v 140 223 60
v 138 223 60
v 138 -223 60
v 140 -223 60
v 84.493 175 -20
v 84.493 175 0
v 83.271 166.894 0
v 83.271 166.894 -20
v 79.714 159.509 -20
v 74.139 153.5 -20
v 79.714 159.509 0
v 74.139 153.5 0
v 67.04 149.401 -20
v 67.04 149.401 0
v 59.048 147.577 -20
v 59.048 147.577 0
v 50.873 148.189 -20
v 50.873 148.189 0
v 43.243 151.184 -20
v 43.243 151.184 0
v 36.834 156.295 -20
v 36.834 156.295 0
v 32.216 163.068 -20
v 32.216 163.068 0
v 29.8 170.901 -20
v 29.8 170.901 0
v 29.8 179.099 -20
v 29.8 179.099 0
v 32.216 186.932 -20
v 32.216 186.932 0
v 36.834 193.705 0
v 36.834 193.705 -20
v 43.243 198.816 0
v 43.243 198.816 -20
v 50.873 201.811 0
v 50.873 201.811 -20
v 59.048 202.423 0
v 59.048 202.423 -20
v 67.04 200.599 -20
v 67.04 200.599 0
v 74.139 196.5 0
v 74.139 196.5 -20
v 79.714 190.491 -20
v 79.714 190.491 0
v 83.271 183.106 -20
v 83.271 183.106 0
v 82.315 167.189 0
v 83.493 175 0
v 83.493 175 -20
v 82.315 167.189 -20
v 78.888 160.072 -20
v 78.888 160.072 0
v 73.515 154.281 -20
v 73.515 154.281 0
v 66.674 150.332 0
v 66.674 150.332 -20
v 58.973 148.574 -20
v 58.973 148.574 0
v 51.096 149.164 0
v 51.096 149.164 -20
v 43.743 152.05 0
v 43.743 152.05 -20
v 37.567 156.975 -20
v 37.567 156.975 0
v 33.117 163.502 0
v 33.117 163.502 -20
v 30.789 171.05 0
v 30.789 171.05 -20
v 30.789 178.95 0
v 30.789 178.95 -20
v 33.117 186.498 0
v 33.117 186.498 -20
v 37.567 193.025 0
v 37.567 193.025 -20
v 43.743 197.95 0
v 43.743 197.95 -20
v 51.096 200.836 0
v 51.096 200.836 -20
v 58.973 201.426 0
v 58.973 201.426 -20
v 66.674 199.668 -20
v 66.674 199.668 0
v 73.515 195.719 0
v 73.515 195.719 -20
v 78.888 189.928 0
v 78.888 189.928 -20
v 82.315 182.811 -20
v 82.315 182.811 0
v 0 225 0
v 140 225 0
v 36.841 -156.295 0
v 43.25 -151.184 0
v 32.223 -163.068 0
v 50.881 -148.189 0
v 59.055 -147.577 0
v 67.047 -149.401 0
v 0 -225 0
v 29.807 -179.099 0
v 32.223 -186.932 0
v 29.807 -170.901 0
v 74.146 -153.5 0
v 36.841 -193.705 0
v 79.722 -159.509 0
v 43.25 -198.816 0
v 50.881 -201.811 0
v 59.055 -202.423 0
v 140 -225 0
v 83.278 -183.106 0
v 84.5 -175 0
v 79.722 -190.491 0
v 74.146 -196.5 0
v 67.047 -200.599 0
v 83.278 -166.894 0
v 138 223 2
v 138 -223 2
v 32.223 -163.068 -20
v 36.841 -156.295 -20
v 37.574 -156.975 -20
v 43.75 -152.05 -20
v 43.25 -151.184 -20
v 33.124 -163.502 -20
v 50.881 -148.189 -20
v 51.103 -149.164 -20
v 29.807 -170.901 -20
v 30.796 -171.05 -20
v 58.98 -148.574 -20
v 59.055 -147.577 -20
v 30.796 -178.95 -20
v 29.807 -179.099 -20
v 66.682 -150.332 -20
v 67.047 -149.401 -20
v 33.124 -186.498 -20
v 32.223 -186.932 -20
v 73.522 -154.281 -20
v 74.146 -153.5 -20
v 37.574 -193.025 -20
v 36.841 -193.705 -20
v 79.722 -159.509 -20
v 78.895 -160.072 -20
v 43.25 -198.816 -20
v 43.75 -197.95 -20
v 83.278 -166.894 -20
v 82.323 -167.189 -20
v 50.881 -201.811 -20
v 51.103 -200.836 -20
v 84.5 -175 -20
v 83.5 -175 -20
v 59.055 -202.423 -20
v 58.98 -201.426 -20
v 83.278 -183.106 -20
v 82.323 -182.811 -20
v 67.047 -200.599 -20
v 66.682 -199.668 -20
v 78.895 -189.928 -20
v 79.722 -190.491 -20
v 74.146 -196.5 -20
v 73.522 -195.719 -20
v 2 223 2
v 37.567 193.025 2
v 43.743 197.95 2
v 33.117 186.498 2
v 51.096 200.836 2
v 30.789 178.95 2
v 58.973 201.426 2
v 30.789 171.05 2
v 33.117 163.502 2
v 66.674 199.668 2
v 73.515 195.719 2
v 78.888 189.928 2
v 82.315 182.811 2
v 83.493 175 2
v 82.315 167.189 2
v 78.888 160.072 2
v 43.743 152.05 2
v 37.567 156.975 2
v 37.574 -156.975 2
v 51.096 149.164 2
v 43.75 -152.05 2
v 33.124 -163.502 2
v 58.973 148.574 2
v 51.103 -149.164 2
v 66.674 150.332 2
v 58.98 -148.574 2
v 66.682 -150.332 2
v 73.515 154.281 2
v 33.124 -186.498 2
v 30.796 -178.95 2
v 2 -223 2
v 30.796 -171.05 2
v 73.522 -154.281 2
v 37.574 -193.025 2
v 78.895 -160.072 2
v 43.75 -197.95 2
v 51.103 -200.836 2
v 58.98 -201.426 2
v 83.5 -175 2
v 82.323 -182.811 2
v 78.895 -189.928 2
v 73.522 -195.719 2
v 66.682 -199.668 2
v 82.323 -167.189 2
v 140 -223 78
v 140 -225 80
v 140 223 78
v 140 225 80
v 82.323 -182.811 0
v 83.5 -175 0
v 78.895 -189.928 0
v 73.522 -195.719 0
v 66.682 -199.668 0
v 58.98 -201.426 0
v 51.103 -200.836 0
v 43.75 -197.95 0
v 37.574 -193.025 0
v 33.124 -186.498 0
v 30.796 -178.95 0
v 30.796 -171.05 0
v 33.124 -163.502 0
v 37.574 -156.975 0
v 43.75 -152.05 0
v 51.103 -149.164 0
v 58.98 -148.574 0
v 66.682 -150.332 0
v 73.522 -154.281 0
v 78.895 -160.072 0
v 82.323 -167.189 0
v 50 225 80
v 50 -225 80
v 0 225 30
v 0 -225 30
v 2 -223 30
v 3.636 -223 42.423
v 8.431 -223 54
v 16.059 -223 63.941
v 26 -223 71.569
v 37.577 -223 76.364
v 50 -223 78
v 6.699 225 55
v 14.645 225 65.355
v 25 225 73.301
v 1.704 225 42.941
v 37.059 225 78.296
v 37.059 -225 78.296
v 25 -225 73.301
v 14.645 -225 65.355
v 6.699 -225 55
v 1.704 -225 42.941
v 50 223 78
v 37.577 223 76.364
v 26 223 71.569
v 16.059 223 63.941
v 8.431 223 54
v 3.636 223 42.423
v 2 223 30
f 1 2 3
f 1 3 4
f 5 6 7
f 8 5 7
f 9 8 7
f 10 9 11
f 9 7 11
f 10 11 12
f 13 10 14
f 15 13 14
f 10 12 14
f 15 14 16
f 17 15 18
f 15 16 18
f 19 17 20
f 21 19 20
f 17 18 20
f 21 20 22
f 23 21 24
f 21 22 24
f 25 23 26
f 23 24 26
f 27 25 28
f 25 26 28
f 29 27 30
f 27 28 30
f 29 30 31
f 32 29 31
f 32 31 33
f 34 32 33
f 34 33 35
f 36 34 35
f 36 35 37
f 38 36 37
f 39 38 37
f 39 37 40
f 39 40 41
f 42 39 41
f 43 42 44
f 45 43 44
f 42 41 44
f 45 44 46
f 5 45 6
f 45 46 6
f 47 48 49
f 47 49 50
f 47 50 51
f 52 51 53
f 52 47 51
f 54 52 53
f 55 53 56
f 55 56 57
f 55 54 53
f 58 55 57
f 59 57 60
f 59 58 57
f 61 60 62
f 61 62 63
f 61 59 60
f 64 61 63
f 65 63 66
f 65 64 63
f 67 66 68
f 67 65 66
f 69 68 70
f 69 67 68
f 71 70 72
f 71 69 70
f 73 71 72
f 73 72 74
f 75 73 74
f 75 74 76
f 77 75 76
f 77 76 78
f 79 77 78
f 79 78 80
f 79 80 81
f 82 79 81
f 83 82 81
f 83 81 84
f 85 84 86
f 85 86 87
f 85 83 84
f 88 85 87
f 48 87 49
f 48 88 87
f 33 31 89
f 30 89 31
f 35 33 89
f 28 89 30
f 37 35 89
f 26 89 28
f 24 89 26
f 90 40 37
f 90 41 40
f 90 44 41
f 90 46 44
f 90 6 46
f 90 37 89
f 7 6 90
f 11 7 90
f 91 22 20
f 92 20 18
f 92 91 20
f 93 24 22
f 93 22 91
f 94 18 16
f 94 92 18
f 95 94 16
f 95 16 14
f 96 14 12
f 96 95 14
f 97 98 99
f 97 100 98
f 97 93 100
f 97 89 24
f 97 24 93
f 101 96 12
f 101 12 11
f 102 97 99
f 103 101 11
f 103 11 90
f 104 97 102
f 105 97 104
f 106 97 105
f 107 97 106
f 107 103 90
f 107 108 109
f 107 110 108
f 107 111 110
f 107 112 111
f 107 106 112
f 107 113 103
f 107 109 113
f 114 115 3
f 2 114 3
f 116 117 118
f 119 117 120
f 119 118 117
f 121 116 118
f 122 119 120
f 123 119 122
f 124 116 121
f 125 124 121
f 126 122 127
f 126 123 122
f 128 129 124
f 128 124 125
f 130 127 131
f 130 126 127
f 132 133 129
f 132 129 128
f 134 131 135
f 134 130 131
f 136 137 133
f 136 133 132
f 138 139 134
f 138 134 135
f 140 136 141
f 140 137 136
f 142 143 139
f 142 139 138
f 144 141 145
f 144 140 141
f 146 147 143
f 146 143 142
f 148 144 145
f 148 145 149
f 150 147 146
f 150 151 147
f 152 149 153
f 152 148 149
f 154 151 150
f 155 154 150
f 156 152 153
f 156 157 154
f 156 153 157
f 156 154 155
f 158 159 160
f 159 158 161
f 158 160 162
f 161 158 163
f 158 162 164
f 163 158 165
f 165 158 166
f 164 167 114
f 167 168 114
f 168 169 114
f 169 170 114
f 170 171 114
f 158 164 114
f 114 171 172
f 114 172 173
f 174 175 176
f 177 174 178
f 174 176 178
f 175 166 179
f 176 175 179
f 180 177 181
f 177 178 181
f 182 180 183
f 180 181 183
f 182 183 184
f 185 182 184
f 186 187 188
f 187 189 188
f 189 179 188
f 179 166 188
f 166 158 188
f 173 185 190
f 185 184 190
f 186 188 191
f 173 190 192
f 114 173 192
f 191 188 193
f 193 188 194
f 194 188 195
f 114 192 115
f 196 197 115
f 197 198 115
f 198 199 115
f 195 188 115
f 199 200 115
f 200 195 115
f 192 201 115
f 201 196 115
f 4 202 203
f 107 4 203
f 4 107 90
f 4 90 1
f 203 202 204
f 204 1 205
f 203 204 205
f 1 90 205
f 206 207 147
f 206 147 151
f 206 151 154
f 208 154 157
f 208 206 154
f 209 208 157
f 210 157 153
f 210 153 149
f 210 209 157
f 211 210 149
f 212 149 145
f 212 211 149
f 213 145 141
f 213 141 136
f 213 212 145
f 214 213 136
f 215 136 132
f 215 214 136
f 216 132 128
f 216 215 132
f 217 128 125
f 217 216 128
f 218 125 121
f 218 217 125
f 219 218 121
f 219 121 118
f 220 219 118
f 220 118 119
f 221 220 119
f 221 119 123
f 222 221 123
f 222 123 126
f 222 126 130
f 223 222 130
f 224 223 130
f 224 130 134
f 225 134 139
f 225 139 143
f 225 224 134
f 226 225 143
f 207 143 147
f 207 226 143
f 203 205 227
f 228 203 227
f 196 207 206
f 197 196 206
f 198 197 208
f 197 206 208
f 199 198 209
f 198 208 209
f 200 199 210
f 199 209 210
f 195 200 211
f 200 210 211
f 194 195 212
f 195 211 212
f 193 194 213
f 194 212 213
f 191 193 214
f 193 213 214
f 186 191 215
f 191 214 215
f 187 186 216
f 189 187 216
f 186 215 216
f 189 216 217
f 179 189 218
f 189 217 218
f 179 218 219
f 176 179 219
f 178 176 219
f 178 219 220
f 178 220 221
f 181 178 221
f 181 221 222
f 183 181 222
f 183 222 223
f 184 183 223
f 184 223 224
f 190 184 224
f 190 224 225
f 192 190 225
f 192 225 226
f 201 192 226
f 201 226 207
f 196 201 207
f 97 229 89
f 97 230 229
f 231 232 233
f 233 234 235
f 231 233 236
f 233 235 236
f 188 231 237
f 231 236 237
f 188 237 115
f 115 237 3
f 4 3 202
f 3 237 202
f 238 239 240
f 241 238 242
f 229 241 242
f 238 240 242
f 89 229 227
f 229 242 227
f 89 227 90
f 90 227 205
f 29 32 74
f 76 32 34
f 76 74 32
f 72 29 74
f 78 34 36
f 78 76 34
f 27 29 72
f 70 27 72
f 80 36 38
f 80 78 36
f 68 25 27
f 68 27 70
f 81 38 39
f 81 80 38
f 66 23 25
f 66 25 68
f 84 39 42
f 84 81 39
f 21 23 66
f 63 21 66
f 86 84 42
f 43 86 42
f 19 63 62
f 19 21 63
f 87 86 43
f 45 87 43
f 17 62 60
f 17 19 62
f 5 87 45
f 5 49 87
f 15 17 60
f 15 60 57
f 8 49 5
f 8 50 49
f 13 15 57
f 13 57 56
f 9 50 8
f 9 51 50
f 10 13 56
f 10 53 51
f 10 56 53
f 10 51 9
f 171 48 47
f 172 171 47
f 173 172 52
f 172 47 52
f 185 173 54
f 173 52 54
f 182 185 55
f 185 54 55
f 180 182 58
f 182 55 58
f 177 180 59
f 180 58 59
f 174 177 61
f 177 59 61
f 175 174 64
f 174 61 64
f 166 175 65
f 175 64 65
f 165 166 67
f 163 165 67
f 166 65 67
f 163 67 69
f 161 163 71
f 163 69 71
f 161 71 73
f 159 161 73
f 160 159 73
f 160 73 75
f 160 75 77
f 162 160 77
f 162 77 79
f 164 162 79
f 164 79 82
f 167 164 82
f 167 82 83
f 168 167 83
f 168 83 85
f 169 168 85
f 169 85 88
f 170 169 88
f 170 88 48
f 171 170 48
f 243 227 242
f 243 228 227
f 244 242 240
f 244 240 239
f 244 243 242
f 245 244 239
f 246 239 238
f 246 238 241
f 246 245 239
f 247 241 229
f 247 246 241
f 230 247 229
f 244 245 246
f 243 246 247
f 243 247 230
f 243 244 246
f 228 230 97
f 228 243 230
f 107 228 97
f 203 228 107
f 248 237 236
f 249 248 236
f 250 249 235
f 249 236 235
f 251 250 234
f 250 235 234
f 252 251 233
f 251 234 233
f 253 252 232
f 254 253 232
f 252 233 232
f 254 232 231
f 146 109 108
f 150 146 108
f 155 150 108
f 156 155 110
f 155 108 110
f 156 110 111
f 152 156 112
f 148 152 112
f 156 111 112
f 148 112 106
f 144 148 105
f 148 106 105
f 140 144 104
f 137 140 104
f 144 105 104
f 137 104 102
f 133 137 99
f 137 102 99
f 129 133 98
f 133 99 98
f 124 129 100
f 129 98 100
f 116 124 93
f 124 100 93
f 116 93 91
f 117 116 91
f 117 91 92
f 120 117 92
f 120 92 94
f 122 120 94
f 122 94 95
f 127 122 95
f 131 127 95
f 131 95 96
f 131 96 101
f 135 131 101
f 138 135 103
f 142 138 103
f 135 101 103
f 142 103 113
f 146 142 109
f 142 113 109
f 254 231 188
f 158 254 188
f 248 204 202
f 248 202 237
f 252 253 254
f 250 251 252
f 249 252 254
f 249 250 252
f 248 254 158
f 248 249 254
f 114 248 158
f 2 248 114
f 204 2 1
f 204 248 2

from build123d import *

# Parameters (mm, degrees)
F1_DEPTH = 225
F2_T     = -2
F3_W     = 2
F3_H     = 58
F4_DEPTH = 446
F5_R     = 26.5
F6_DEPTH = 25.4
F7_R     = 27.5
F7_R_2   = 26.5
F8_DEPTH = 20


with BuildPart() as f1:
    # F0 (on Front) → F1 (new body, symmetric)
    with BuildSketch(Plane.XZ):
        with BuildLine():
            Line((0, 30), (0, 0))
            Line((0, 0), (140, 0))
            Line((140, 0), (140, 80))
            Line((140, 80), (50, 80))
            ThreePointArc((50, 80), (14.6446609407, 65.3553390593), (0, 30))
        make_face()
    extrude(amount=F1_DEPTH, both=True)

    # F2
    f2_openings = [f1.faces().sort_by_distance(p)[0] for p in [
        (140, 0, 40),
    ]]
    offset(amount=F2_T, openings=f2_openings)

    # F3 (on face) → F4 (join, through all)
    with BuildSketch(Plane.XZ.offset(-223)):
        with Locations((139, 31)):
            Rectangle(F3_W, F3_H)
    extrude(amount=F4_DEPTH)

    # F5 (on face) → F6 (cut)
    with BuildSketch(Plane(origin=(0, 0, 0), x_dir=(1, 0, 0), z_dir=(0, 0, -1))):
        with Locations((57, 175)):
            Circle(F5_R)
        with Locations((56.9928, -175)):
            Circle(F5_R)
    extrude(amount=-F6_DEPTH, mode=Mode.SUBTRACT)

    # F7 (on face) → F8 (join)
    with BuildSketch(Plane(origin=(0, 0, 0), x_dir=(1, 0, 0), z_dir=(0, 0, -1))):
        with Locations((57, 175)):
            Circle(F7_R)
        with Locations((57, 175)):
            Circle(F7_R_2, mode=Mode.SUBTRACT)
        with Locations((56.9928, -175)):
            Circle(F7_R)
        with Locations((56.9928, -175)):
            Circle(F7_R_2, mode=Mode.SUBTRACT)
    extrude(amount=F8_DEPTH)


solid = f1.part
